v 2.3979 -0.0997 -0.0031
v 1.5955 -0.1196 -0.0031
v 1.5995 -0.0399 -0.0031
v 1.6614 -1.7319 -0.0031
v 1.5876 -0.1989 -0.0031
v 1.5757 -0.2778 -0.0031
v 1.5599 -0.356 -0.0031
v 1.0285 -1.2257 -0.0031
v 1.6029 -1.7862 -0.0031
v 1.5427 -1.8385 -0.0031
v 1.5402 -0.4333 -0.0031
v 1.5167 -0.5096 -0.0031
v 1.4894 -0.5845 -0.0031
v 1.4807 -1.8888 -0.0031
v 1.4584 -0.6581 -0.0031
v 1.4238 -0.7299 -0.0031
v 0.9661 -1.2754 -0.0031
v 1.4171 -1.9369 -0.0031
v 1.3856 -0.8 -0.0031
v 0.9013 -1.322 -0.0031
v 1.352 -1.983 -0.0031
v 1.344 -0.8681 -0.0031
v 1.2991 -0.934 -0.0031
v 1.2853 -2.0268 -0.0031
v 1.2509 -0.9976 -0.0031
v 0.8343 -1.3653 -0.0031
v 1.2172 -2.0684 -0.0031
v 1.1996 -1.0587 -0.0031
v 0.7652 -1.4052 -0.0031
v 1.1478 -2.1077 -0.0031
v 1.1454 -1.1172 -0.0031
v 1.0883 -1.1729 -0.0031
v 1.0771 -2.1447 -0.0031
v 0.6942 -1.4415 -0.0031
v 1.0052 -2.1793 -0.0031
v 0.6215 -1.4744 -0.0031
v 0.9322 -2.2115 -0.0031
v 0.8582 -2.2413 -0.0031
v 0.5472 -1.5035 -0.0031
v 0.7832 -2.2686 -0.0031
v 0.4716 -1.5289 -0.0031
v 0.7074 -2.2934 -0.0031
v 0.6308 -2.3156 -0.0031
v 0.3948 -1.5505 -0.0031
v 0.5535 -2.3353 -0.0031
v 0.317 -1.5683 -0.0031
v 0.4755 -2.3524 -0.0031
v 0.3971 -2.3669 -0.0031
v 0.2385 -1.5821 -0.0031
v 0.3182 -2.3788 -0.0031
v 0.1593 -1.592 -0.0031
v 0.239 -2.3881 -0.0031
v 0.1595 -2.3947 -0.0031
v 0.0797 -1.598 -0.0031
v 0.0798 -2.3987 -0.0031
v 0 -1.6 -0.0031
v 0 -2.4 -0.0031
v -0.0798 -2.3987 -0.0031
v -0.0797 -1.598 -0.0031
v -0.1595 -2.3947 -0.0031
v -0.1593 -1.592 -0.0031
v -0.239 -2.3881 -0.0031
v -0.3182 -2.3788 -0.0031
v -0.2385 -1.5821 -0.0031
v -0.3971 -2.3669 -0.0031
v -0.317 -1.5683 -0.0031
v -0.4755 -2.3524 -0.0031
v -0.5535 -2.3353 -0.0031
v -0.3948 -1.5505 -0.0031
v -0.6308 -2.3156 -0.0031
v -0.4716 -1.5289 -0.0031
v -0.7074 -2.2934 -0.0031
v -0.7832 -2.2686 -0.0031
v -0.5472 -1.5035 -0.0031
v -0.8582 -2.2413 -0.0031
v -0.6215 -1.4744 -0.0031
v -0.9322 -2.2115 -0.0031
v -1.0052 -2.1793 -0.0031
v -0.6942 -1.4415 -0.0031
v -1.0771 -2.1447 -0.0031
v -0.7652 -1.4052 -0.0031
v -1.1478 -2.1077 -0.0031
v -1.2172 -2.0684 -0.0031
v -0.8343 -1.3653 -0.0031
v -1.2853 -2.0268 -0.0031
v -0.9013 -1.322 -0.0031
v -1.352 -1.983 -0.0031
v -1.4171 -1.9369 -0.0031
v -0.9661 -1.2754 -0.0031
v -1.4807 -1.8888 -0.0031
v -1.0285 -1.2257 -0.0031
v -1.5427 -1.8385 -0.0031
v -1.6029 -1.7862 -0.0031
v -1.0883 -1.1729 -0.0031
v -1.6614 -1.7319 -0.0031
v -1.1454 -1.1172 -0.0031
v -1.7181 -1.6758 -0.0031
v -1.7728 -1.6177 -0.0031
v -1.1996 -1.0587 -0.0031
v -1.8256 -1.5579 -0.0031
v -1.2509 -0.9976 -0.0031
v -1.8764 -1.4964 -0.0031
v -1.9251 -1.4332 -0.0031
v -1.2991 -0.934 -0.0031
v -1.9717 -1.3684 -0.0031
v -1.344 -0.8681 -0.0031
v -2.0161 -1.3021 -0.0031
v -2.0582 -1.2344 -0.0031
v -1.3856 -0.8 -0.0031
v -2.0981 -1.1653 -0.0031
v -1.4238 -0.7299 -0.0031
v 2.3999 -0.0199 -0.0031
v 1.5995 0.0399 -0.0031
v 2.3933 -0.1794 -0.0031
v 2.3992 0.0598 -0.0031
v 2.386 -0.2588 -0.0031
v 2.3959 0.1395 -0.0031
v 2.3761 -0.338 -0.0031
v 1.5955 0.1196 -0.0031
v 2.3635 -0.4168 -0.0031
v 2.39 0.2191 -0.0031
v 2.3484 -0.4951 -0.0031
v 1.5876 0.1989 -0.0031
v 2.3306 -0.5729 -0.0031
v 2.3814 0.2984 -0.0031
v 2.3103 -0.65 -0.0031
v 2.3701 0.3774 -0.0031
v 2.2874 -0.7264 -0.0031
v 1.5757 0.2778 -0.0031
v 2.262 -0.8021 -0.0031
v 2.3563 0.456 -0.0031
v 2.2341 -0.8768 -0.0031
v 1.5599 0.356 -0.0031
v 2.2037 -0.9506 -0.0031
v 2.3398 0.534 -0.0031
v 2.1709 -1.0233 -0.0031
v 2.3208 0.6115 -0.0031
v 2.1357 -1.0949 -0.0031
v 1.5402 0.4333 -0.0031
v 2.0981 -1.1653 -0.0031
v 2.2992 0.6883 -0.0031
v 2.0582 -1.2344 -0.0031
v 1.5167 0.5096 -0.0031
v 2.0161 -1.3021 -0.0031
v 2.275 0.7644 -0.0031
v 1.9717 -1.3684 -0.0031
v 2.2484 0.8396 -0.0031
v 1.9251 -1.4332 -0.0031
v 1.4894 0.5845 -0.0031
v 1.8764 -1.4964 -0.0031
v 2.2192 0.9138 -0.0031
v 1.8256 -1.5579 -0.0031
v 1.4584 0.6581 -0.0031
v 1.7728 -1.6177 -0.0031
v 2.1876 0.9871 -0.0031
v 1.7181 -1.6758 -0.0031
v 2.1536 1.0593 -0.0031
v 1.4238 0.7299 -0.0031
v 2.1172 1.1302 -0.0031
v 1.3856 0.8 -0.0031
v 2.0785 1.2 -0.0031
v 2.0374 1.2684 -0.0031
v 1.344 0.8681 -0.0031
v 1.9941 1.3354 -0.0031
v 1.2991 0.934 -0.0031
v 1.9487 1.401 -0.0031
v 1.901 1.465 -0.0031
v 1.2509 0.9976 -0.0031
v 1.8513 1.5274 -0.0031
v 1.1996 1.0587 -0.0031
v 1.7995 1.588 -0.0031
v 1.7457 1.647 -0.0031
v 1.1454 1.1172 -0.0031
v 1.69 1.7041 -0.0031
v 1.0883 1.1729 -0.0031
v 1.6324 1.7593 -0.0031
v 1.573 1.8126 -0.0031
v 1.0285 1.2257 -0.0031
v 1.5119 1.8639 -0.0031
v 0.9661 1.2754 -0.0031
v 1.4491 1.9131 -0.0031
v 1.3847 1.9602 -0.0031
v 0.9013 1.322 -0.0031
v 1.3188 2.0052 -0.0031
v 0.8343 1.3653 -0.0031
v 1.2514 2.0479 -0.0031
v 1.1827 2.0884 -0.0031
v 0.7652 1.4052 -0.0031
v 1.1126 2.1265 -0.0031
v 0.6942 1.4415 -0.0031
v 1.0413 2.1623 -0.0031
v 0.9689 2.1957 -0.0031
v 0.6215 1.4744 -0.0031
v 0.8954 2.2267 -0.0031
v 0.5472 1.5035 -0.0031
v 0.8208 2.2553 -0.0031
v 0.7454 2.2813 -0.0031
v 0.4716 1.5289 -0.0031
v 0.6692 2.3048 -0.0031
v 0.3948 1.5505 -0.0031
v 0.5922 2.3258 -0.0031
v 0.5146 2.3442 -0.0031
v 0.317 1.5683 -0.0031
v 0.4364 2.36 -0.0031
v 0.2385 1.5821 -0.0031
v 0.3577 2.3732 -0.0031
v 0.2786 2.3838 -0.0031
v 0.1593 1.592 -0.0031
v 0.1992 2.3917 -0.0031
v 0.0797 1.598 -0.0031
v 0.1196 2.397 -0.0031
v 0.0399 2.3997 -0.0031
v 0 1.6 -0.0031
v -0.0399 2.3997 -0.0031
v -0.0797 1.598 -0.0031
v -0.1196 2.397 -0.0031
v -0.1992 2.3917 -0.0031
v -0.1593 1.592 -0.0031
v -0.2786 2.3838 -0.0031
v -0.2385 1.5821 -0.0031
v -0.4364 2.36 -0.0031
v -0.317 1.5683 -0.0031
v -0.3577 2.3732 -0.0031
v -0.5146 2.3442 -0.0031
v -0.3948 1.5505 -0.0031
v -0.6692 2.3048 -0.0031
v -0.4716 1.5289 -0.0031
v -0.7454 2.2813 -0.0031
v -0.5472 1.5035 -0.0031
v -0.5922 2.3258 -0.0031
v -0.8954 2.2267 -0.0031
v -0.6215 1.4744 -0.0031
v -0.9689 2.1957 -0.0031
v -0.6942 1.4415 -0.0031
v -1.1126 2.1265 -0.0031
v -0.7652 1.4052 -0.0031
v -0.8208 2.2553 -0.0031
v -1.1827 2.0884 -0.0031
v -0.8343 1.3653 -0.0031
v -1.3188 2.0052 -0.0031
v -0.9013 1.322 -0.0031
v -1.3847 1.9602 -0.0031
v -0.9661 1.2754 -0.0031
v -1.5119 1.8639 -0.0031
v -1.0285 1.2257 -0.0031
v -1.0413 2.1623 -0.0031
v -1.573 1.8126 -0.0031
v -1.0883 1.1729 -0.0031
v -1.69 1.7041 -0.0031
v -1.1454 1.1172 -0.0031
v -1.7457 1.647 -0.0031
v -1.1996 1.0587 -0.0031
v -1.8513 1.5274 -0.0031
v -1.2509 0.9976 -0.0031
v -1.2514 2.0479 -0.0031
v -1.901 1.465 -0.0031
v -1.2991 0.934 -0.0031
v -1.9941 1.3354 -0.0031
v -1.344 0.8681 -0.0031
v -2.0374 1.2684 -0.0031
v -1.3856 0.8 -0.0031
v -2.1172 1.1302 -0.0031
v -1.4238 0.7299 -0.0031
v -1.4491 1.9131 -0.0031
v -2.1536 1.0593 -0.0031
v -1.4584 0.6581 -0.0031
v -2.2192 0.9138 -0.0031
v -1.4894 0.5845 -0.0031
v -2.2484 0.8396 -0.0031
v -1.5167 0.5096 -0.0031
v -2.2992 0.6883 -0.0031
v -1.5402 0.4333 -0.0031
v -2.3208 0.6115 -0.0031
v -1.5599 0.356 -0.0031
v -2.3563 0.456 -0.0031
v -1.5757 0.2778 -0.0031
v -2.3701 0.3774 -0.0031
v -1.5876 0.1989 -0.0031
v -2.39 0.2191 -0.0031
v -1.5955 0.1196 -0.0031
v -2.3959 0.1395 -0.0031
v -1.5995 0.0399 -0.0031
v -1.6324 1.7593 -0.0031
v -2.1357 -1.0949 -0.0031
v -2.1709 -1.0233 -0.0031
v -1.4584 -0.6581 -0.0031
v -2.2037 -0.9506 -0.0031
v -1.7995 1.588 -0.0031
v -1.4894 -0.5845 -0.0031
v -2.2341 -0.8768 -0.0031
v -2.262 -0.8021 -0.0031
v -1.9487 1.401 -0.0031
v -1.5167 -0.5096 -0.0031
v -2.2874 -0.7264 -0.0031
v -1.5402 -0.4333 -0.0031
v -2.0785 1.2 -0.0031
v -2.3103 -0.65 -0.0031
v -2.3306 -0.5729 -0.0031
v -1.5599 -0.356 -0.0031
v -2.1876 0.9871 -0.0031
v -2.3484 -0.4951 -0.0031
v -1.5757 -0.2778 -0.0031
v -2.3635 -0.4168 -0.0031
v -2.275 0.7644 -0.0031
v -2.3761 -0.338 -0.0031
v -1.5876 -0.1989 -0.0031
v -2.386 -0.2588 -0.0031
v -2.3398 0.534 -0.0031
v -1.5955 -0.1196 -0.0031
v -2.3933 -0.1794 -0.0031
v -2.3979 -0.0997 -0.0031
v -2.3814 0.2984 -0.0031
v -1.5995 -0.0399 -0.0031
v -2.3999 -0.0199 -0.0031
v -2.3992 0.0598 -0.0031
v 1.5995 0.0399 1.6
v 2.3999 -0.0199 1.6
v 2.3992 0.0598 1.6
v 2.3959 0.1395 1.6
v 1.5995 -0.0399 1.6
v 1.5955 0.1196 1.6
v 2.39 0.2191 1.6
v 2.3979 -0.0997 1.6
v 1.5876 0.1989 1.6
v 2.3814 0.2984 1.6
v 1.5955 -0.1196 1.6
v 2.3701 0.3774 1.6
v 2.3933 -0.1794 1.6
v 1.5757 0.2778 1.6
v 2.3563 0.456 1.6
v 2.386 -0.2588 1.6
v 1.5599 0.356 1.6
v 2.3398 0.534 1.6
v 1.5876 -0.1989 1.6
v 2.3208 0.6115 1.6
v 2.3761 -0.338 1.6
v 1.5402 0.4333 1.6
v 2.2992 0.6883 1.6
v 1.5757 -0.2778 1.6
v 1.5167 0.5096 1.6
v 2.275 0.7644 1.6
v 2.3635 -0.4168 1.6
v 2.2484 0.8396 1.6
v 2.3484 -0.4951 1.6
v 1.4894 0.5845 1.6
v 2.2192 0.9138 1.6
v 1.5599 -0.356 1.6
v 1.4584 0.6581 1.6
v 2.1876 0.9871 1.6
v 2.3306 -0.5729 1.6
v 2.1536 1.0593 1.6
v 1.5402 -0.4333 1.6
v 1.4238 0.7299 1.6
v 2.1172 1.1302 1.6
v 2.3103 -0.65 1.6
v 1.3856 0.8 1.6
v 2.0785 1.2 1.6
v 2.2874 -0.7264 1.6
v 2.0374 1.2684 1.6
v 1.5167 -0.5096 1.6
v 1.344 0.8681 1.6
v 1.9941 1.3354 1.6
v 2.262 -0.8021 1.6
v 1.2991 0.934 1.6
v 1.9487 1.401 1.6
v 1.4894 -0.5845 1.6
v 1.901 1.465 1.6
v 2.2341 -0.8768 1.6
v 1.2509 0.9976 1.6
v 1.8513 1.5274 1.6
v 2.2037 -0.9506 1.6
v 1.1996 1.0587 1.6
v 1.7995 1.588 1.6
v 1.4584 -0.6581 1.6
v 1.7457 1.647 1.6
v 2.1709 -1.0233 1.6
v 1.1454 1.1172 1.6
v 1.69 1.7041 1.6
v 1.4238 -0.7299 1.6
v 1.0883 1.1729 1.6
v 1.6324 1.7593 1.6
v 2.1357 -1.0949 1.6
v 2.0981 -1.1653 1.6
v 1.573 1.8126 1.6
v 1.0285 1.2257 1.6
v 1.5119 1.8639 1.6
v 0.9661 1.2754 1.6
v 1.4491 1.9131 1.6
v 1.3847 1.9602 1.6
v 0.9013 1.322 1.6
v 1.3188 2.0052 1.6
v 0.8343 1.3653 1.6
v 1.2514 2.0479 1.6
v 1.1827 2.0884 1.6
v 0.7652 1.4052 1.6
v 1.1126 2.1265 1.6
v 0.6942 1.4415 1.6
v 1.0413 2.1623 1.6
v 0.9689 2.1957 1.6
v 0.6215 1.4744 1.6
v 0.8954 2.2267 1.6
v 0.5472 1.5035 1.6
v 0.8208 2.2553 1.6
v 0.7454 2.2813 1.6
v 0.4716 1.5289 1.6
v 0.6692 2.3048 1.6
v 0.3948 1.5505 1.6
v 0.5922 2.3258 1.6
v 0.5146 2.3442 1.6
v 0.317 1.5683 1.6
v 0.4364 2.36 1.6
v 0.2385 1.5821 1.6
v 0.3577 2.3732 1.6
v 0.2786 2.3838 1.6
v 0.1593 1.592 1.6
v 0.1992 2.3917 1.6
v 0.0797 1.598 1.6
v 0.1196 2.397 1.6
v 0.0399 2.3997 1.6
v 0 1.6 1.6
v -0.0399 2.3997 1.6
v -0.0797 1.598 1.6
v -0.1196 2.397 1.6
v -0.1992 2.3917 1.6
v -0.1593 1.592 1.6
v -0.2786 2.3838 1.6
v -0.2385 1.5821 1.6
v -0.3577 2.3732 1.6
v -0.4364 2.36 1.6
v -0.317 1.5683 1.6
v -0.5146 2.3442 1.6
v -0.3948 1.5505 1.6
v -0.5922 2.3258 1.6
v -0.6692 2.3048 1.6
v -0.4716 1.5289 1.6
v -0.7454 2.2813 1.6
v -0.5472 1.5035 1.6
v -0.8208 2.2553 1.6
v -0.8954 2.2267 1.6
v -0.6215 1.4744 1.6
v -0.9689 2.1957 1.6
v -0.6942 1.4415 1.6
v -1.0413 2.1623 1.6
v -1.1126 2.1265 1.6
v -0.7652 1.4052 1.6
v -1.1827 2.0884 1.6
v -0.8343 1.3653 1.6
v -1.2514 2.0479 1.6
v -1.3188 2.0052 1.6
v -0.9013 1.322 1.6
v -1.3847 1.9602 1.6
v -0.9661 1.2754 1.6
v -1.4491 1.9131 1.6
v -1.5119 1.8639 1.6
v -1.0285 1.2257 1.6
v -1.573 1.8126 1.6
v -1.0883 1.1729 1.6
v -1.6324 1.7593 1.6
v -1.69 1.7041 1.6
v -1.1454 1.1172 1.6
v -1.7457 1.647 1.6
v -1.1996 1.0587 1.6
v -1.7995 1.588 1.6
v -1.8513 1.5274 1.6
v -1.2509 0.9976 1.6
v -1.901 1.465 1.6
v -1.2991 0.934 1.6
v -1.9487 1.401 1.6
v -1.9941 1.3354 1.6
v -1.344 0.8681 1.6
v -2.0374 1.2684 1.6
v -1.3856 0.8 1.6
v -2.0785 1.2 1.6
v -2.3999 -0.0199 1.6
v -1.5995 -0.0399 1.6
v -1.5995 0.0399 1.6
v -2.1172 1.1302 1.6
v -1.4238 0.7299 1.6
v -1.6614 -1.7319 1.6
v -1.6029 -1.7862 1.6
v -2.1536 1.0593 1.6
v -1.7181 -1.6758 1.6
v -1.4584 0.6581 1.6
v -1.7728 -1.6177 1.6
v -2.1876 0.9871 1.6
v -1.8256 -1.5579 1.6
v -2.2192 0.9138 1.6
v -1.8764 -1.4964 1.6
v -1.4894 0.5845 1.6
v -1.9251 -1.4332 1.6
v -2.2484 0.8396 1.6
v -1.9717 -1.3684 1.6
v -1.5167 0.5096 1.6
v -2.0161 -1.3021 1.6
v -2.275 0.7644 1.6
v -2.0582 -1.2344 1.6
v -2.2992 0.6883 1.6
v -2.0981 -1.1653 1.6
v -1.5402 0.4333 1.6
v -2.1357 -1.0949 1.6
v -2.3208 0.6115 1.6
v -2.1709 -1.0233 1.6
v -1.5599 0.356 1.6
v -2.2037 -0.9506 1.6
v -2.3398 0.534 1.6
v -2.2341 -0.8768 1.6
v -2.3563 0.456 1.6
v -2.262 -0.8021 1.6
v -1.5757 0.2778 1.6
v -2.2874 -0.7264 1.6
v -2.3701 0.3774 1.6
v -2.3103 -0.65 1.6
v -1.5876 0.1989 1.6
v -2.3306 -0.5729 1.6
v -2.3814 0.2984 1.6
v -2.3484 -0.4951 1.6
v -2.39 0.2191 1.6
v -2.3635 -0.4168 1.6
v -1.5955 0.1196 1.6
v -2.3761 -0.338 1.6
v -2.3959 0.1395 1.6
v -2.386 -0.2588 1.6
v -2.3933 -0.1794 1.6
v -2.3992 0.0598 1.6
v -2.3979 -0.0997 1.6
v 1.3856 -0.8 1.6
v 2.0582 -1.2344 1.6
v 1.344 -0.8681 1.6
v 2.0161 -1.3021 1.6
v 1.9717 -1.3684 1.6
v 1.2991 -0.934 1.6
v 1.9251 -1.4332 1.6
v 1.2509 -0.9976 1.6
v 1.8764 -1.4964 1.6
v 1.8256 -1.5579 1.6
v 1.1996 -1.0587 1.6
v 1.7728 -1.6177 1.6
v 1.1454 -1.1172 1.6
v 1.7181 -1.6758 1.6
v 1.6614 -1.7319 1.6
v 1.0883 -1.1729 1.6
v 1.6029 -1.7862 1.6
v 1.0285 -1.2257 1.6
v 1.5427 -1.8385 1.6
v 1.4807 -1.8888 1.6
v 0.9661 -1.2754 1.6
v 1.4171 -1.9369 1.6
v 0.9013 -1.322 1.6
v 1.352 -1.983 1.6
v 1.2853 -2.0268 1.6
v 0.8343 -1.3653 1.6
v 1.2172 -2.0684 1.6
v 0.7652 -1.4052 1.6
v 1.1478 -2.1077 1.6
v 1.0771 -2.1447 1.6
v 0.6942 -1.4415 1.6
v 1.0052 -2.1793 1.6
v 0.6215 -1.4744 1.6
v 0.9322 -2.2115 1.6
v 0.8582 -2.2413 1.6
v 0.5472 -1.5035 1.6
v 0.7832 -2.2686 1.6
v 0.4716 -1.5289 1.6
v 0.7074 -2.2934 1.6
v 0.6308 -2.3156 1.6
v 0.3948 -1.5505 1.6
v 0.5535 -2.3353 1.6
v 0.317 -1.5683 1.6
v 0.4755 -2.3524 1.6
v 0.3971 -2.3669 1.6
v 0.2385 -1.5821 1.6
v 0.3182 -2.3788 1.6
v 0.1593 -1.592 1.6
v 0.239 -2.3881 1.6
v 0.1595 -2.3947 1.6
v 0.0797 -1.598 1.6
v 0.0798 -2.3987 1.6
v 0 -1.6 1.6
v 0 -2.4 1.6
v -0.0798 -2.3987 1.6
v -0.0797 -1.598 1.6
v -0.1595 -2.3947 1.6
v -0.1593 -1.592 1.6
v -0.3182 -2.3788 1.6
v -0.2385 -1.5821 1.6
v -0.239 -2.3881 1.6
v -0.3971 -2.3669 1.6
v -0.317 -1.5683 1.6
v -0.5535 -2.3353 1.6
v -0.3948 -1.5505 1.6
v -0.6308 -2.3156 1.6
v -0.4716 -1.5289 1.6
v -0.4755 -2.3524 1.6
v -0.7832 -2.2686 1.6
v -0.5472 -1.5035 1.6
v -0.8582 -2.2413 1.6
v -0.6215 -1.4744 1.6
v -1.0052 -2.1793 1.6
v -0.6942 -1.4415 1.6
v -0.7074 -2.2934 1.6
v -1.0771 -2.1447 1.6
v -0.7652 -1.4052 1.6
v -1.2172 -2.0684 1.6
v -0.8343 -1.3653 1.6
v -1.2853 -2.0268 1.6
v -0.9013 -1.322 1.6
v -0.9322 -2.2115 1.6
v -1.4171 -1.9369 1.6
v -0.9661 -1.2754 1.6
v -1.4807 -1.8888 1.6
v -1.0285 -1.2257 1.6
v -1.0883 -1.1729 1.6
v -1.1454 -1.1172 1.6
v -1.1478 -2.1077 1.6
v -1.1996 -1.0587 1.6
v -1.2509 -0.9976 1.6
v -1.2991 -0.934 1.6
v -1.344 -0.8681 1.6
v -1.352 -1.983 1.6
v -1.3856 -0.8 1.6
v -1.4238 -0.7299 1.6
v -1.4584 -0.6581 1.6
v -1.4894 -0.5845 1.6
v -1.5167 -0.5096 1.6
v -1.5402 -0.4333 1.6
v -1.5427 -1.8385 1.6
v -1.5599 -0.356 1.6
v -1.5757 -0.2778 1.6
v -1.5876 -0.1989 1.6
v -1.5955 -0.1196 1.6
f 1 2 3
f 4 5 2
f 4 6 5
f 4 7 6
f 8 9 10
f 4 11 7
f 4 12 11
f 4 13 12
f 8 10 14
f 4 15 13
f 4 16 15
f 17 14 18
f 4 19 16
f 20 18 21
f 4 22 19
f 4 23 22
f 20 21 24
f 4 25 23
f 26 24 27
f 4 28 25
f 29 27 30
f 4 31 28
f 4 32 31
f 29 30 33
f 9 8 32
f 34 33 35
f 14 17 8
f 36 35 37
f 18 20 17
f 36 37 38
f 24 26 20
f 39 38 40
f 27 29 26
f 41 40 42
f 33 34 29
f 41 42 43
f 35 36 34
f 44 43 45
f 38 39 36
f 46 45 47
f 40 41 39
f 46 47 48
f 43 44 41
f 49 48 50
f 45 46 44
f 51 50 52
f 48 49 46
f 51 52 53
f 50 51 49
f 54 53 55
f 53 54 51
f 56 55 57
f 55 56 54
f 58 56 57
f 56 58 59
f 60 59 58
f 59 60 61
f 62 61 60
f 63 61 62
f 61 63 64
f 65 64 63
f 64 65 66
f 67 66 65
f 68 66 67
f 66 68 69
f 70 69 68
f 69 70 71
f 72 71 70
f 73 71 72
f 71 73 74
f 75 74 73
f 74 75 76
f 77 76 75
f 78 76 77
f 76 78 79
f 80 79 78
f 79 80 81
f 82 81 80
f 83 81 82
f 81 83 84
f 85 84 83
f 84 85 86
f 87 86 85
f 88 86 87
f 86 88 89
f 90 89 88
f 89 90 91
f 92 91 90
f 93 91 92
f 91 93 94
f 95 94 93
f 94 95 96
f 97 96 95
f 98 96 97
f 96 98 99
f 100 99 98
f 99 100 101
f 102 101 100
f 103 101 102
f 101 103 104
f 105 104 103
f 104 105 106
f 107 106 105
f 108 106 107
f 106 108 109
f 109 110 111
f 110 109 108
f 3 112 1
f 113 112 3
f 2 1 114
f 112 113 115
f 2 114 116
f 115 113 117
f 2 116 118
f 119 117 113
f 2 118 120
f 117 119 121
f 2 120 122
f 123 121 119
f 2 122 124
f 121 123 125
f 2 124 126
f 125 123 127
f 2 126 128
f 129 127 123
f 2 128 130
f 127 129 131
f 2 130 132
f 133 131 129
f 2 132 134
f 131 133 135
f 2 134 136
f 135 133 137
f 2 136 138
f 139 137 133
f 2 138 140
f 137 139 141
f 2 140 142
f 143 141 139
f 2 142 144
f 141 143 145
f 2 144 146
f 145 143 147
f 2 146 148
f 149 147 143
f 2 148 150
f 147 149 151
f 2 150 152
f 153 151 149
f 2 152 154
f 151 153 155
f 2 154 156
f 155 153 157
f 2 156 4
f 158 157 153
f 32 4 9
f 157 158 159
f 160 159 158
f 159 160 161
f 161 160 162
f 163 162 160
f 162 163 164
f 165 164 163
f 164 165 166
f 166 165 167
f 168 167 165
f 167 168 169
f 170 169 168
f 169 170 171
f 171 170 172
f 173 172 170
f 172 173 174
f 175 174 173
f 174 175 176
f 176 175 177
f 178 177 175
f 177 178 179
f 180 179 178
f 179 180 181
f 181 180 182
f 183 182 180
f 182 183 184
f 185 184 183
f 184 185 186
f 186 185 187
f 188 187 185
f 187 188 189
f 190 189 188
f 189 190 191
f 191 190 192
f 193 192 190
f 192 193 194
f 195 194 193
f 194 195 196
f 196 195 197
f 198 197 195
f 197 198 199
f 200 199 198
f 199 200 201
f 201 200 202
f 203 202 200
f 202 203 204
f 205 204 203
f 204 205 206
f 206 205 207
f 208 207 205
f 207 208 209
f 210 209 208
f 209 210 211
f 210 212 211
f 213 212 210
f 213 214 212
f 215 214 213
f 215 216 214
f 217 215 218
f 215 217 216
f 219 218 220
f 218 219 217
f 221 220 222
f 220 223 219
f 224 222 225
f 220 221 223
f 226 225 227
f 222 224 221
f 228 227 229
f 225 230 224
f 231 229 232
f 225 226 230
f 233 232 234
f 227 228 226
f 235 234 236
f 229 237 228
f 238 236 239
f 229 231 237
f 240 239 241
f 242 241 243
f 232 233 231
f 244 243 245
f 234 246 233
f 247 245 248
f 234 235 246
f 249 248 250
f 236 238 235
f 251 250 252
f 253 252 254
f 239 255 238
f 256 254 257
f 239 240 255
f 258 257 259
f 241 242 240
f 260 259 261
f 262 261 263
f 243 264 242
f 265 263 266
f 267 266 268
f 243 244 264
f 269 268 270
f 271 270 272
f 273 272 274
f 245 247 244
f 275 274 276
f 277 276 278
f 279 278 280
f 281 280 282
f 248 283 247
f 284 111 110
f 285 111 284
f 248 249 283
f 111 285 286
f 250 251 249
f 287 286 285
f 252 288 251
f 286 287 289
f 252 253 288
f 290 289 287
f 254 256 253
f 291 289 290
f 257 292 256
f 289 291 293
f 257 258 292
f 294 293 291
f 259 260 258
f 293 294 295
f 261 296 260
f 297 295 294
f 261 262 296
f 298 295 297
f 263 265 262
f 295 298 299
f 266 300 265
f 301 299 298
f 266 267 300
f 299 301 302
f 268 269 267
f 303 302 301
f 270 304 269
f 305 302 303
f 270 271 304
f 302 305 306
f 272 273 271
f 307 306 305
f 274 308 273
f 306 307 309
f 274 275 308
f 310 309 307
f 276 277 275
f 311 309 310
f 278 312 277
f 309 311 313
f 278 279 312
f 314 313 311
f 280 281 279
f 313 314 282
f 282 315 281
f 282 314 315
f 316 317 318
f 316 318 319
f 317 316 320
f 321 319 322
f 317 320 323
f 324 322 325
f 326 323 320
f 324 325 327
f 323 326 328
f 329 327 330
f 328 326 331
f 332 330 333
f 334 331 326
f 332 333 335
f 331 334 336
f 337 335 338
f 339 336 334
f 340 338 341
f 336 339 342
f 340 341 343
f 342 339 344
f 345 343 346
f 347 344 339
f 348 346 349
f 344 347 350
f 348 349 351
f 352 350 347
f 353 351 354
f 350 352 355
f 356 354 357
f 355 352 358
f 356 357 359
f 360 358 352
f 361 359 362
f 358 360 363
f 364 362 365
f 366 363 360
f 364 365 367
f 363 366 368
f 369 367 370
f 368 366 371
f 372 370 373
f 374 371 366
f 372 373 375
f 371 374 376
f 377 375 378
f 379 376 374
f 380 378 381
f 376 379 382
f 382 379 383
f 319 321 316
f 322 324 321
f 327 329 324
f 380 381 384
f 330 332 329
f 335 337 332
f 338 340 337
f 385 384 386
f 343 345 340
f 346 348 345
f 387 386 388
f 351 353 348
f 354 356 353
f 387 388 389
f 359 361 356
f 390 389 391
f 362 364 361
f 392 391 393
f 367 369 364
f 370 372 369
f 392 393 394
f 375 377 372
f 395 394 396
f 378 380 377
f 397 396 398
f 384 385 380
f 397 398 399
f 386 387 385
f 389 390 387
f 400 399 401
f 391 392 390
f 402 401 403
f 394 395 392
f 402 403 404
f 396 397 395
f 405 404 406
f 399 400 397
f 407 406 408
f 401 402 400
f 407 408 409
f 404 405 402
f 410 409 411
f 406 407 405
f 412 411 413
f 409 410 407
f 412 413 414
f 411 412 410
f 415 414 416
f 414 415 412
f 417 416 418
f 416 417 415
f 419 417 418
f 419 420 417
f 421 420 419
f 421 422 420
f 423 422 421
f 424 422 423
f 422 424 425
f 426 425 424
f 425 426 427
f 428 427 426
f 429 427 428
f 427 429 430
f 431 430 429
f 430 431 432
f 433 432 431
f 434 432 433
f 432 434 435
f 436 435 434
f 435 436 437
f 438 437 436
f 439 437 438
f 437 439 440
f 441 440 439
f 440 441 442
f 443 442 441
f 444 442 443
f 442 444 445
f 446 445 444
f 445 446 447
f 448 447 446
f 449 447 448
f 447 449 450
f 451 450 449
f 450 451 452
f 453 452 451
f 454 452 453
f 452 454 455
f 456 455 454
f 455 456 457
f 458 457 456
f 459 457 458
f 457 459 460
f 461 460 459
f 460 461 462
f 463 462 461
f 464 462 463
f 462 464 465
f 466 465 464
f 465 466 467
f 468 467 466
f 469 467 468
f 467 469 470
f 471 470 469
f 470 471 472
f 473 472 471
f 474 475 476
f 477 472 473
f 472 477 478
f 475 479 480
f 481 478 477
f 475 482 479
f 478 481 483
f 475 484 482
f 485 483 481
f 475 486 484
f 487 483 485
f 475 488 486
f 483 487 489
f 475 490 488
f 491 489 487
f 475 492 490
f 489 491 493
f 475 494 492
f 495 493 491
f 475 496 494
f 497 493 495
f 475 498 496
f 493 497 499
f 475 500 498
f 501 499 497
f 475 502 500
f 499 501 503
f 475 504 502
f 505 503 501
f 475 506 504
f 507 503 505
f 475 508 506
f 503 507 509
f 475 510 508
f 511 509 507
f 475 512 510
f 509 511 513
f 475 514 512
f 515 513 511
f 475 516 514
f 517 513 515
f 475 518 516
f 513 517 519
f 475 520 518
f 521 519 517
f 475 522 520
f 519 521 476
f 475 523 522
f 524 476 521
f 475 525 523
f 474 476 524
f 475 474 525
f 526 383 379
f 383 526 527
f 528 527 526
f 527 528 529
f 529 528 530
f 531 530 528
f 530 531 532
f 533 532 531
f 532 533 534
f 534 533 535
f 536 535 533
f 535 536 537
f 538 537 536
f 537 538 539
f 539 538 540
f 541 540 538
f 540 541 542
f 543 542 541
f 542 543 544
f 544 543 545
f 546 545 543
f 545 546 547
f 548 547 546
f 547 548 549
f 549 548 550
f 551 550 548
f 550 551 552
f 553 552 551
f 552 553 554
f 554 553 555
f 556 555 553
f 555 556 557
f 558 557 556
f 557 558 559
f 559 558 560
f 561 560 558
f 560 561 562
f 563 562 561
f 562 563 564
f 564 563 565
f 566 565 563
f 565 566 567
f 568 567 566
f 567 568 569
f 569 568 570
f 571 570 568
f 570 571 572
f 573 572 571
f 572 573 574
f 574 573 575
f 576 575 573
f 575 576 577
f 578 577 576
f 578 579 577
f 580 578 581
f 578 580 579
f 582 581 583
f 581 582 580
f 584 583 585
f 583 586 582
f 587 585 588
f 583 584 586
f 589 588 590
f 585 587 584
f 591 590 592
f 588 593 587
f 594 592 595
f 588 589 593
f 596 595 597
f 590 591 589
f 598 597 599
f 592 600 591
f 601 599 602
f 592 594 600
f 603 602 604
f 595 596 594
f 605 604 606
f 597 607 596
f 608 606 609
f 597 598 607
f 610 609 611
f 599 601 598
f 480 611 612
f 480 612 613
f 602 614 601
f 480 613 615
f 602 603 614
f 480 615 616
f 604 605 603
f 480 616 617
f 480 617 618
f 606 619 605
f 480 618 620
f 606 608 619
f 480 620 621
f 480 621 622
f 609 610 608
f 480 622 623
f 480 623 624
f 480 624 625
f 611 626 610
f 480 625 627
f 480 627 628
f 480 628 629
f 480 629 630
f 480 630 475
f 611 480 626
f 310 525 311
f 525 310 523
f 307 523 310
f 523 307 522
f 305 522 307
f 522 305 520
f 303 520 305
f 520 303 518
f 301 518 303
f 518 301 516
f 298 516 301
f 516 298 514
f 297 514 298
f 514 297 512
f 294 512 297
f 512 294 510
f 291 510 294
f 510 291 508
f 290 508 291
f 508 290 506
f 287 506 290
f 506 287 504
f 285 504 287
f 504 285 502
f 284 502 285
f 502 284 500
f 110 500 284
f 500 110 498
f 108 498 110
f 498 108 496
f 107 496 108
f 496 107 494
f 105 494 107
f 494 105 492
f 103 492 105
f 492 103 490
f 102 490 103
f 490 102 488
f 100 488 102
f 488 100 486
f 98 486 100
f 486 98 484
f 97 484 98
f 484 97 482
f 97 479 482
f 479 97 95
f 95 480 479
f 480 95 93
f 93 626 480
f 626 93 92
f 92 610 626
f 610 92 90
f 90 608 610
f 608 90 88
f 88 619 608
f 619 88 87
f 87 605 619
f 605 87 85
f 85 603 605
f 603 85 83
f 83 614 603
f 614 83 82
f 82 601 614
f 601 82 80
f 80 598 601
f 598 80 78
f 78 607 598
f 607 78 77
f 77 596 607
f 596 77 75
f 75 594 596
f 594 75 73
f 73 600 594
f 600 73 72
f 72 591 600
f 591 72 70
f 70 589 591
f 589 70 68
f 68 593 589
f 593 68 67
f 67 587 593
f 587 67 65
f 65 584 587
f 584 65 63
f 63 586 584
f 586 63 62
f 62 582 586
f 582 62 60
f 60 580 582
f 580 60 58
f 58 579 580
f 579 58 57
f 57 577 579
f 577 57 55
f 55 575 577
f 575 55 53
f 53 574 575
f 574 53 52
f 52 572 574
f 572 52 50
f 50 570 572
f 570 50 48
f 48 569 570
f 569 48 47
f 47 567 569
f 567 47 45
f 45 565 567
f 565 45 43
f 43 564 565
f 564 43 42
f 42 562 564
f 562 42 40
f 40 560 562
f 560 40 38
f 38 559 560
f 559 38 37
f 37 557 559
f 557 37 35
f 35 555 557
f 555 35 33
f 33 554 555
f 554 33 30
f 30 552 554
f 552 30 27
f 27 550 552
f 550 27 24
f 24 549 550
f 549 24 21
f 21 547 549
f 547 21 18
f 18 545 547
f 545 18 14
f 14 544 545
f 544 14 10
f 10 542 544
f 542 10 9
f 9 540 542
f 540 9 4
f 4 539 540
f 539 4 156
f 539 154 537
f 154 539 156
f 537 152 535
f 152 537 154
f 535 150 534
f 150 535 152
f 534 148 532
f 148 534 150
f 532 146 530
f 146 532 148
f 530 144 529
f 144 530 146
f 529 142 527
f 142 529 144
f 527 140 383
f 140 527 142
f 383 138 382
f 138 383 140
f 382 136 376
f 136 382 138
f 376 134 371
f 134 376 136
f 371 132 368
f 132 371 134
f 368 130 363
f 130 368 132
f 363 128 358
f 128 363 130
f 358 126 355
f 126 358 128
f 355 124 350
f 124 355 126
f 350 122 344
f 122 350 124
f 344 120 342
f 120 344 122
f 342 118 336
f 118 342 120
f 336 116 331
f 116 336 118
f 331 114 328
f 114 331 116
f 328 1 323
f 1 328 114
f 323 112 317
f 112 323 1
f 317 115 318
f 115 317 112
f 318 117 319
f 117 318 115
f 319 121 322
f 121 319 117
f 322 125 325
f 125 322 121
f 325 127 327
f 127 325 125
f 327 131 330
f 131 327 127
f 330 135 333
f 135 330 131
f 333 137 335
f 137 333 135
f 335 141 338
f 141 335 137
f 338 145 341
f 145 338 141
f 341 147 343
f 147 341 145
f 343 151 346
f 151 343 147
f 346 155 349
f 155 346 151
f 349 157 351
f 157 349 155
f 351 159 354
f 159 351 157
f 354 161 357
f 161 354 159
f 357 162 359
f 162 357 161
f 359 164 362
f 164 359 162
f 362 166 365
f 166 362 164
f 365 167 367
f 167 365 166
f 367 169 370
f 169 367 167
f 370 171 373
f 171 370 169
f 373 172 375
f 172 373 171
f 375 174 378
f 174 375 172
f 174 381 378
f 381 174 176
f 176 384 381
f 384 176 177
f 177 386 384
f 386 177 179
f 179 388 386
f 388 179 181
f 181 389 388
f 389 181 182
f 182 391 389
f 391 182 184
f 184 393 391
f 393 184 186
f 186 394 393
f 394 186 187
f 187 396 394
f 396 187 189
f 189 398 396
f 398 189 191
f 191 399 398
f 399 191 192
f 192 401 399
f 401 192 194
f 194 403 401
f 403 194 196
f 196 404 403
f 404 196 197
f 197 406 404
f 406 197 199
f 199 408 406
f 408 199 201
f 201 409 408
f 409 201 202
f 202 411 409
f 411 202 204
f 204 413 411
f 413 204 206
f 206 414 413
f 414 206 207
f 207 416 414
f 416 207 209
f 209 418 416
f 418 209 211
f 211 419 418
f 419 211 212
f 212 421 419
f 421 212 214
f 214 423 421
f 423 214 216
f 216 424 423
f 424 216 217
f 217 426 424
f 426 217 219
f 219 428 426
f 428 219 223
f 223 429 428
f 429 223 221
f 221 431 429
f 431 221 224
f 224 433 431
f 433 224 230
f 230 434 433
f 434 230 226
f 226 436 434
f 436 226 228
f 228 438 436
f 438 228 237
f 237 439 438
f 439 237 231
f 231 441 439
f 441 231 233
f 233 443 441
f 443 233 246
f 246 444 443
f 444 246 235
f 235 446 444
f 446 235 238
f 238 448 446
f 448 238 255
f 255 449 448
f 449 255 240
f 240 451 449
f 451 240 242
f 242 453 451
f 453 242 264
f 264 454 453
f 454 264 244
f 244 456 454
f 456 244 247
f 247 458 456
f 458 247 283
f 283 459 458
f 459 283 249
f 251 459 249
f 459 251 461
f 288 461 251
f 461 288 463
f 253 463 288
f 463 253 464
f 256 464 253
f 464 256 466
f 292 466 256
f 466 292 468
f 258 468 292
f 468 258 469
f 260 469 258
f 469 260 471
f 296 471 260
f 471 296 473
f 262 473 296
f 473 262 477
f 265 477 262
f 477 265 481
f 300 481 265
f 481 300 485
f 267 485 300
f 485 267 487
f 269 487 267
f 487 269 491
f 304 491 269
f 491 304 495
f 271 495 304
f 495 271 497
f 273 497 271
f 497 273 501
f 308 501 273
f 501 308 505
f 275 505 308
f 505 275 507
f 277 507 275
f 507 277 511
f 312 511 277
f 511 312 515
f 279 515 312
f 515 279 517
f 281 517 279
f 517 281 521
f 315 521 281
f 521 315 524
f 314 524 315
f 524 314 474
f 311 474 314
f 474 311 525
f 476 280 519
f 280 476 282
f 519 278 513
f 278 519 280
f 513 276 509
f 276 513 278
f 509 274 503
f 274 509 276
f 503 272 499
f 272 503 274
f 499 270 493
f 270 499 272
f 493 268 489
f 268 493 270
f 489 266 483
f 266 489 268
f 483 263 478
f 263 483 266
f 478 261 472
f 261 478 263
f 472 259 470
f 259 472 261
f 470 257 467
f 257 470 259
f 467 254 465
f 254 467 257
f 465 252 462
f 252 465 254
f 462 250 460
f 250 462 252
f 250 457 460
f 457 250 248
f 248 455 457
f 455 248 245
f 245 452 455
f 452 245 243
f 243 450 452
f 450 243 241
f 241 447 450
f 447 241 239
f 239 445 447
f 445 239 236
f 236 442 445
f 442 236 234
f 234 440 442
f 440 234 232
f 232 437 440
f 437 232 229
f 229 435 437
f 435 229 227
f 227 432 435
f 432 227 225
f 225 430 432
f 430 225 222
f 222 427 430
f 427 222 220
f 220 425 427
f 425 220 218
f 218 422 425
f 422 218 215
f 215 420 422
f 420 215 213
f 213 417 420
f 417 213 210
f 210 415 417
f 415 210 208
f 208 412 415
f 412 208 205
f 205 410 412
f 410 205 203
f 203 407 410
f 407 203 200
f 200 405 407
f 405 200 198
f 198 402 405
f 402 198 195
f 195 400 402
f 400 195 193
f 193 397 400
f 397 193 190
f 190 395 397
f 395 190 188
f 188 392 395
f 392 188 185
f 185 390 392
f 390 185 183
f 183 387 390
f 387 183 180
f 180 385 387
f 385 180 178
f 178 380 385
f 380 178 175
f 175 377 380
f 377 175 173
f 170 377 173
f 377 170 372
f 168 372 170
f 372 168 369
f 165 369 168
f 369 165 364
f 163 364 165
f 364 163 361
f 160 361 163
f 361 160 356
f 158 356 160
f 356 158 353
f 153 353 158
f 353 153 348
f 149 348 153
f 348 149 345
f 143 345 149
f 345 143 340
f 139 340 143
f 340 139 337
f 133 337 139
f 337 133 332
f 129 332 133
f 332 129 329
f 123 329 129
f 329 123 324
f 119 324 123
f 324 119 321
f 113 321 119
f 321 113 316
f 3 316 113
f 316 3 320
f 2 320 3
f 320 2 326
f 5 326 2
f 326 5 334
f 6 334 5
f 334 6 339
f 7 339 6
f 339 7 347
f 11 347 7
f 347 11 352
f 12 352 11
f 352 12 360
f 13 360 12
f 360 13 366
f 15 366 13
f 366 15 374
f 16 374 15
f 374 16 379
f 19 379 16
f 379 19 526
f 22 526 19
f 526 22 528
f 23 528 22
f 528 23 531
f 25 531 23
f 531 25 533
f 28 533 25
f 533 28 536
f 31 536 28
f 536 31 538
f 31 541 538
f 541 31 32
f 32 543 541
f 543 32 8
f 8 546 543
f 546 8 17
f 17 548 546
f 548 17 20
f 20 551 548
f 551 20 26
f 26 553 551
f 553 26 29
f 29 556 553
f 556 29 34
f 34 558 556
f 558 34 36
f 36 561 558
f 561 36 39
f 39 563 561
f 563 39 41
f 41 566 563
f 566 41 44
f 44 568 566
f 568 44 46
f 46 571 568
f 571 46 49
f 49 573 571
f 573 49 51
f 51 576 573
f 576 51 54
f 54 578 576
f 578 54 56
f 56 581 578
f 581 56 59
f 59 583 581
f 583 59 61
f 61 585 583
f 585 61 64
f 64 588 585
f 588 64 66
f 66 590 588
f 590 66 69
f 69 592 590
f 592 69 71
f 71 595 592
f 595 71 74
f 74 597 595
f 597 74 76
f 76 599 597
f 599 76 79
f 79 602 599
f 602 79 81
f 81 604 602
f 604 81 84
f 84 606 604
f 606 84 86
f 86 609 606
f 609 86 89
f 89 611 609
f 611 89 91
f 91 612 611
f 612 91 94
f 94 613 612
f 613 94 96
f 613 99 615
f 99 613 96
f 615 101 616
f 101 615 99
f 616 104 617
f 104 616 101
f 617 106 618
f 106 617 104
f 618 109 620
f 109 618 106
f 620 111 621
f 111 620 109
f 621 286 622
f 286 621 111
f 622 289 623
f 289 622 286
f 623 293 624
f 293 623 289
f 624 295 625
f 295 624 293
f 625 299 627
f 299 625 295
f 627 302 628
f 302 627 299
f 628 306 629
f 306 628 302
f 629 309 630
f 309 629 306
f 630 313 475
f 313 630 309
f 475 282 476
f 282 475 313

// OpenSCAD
use <../lib.scad>
use <../p/1-4cyli.scad>
use <s/4181s01.scad>
use <s/4181s02.scad>
use <s/4865p01b.scad>
use <s/4865p01c.scad>
use <../p/stud2.scad>
$fa=1; $fs=0.2;
function ldraw_lib__4182p08(realsolid=false) = [
// 0 Train Door  1 x  4 x  5 Right White Stripe Train Logo Pattern
// 0 Name: 4182p08.dat
// 0 Author: Max Martin Richter [MMR1988]
// 0 !LDRAW_ORG Part UPDATE 2013-01
// 0 !LICENSE Licensed under CC BY 2.0 and CC BY 4.0 : see CAreadme.txt
// 
// 0 BFC CERTIFY CCW
  [0,"BFC","CERTIFY"],
  [0,"BFC","CCW"],
// 
// 0 !HISTORY 2013-07-21 [PTadmin] Official Update 2013-01
// 
// 
// 1 16 0 0 0 1 0 0 0 1 0 0 0 1 stud2.dat
  [1,16,0,0,0,1,0,0,0,1,0,0,0,1, ldraw_lib__stud2(realsolid)],
// 1 16 0 0 0 -1 0 0 0 1 0 0 0 1 s\4181s01.dat
  [1,16,0,0,0,-1,0,0,0,1,0,0,0,1, ldraw_lib__s__4181s01(realsolid)],
// 1 16 0 96 0 -1 0 0 0 3 0 0 0 1 s\4181s02.dat
  [1,16,0,96,0,-1,0,0,0,3,0,0,0,1, ldraw_lib__s__4181s02(realsolid)],
// 
// 4 15 -10 72 60 -10 96 60 -10 91 47.5 -10 77 47.5
  [4,15,-10,72,60,-10,96,60,-10,91,47.5,-10,77,47.5],
// 4 15 -10 77 12.5 -10 91 12.5 -10 96 0 -10 72 0
  [4,15,-10,77,12.5,-10,91,12.5,-10,96,0,-10,72,0],
// 4 15 -10 72 0 -10 72 60 -10 77 47.5 -10 77 12.5
  [4,15,-10,72,0,-10,72,60,-10,77,47.5,-10,77,12.5],
// 4 15 -10 91 12.5 -10 91 47.5 -10 96 60 -10 96 0
  [4,15,-10,91,12.5,-10,91,47.5,-10,96,60,-10,96,0],
// 1 15 -10 84 30 0 0 1 0 1.75 0 1.75 0 0 s\4865p01b.dat
  [1,15,-10,84,30,0,0,1,0,1.75,0,1.75,0,0, ldraw_lib__s__4865p01b(realsolid)],
// 1 16 -10 84 30 0 0 1 0 1.75 0 1.75 0 0 s\4865p01c.dat
  [1,16,-10,84,30,0,0,1,0,1.75,0,1.75,0,0, ldraw_lib__s__4865p01c(realsolid)],
// 1 15 0 72 0 -10 0 0 0 24 0 0 0 -10 1-4cyli.dat
  [1,15,0,72,0,-10,0,0,0,24,0,0,0,-10, ldraw_lib__1_4cyli(realsolid)],
// 1 15 0 72 60 -10 0 0 0 24 0 0 0 10 1-4cyli.dat
  [1,15,0,72,60,-10,0,0,0,24,0,0,0,10, ldraw_lib__1_4cyli(realsolid)],
];
module ldraw_lib__4182p08(step=0, col=false, unit=2/5, alt=false, line=0.2, solid=!$preview)
    makepoly(ldraw_lib__4182p08(solid), step=step, col=col, unit=unit, alt=alt, line=line, solid=solid);
ldraw_lib__4182p08(line=0.2);
